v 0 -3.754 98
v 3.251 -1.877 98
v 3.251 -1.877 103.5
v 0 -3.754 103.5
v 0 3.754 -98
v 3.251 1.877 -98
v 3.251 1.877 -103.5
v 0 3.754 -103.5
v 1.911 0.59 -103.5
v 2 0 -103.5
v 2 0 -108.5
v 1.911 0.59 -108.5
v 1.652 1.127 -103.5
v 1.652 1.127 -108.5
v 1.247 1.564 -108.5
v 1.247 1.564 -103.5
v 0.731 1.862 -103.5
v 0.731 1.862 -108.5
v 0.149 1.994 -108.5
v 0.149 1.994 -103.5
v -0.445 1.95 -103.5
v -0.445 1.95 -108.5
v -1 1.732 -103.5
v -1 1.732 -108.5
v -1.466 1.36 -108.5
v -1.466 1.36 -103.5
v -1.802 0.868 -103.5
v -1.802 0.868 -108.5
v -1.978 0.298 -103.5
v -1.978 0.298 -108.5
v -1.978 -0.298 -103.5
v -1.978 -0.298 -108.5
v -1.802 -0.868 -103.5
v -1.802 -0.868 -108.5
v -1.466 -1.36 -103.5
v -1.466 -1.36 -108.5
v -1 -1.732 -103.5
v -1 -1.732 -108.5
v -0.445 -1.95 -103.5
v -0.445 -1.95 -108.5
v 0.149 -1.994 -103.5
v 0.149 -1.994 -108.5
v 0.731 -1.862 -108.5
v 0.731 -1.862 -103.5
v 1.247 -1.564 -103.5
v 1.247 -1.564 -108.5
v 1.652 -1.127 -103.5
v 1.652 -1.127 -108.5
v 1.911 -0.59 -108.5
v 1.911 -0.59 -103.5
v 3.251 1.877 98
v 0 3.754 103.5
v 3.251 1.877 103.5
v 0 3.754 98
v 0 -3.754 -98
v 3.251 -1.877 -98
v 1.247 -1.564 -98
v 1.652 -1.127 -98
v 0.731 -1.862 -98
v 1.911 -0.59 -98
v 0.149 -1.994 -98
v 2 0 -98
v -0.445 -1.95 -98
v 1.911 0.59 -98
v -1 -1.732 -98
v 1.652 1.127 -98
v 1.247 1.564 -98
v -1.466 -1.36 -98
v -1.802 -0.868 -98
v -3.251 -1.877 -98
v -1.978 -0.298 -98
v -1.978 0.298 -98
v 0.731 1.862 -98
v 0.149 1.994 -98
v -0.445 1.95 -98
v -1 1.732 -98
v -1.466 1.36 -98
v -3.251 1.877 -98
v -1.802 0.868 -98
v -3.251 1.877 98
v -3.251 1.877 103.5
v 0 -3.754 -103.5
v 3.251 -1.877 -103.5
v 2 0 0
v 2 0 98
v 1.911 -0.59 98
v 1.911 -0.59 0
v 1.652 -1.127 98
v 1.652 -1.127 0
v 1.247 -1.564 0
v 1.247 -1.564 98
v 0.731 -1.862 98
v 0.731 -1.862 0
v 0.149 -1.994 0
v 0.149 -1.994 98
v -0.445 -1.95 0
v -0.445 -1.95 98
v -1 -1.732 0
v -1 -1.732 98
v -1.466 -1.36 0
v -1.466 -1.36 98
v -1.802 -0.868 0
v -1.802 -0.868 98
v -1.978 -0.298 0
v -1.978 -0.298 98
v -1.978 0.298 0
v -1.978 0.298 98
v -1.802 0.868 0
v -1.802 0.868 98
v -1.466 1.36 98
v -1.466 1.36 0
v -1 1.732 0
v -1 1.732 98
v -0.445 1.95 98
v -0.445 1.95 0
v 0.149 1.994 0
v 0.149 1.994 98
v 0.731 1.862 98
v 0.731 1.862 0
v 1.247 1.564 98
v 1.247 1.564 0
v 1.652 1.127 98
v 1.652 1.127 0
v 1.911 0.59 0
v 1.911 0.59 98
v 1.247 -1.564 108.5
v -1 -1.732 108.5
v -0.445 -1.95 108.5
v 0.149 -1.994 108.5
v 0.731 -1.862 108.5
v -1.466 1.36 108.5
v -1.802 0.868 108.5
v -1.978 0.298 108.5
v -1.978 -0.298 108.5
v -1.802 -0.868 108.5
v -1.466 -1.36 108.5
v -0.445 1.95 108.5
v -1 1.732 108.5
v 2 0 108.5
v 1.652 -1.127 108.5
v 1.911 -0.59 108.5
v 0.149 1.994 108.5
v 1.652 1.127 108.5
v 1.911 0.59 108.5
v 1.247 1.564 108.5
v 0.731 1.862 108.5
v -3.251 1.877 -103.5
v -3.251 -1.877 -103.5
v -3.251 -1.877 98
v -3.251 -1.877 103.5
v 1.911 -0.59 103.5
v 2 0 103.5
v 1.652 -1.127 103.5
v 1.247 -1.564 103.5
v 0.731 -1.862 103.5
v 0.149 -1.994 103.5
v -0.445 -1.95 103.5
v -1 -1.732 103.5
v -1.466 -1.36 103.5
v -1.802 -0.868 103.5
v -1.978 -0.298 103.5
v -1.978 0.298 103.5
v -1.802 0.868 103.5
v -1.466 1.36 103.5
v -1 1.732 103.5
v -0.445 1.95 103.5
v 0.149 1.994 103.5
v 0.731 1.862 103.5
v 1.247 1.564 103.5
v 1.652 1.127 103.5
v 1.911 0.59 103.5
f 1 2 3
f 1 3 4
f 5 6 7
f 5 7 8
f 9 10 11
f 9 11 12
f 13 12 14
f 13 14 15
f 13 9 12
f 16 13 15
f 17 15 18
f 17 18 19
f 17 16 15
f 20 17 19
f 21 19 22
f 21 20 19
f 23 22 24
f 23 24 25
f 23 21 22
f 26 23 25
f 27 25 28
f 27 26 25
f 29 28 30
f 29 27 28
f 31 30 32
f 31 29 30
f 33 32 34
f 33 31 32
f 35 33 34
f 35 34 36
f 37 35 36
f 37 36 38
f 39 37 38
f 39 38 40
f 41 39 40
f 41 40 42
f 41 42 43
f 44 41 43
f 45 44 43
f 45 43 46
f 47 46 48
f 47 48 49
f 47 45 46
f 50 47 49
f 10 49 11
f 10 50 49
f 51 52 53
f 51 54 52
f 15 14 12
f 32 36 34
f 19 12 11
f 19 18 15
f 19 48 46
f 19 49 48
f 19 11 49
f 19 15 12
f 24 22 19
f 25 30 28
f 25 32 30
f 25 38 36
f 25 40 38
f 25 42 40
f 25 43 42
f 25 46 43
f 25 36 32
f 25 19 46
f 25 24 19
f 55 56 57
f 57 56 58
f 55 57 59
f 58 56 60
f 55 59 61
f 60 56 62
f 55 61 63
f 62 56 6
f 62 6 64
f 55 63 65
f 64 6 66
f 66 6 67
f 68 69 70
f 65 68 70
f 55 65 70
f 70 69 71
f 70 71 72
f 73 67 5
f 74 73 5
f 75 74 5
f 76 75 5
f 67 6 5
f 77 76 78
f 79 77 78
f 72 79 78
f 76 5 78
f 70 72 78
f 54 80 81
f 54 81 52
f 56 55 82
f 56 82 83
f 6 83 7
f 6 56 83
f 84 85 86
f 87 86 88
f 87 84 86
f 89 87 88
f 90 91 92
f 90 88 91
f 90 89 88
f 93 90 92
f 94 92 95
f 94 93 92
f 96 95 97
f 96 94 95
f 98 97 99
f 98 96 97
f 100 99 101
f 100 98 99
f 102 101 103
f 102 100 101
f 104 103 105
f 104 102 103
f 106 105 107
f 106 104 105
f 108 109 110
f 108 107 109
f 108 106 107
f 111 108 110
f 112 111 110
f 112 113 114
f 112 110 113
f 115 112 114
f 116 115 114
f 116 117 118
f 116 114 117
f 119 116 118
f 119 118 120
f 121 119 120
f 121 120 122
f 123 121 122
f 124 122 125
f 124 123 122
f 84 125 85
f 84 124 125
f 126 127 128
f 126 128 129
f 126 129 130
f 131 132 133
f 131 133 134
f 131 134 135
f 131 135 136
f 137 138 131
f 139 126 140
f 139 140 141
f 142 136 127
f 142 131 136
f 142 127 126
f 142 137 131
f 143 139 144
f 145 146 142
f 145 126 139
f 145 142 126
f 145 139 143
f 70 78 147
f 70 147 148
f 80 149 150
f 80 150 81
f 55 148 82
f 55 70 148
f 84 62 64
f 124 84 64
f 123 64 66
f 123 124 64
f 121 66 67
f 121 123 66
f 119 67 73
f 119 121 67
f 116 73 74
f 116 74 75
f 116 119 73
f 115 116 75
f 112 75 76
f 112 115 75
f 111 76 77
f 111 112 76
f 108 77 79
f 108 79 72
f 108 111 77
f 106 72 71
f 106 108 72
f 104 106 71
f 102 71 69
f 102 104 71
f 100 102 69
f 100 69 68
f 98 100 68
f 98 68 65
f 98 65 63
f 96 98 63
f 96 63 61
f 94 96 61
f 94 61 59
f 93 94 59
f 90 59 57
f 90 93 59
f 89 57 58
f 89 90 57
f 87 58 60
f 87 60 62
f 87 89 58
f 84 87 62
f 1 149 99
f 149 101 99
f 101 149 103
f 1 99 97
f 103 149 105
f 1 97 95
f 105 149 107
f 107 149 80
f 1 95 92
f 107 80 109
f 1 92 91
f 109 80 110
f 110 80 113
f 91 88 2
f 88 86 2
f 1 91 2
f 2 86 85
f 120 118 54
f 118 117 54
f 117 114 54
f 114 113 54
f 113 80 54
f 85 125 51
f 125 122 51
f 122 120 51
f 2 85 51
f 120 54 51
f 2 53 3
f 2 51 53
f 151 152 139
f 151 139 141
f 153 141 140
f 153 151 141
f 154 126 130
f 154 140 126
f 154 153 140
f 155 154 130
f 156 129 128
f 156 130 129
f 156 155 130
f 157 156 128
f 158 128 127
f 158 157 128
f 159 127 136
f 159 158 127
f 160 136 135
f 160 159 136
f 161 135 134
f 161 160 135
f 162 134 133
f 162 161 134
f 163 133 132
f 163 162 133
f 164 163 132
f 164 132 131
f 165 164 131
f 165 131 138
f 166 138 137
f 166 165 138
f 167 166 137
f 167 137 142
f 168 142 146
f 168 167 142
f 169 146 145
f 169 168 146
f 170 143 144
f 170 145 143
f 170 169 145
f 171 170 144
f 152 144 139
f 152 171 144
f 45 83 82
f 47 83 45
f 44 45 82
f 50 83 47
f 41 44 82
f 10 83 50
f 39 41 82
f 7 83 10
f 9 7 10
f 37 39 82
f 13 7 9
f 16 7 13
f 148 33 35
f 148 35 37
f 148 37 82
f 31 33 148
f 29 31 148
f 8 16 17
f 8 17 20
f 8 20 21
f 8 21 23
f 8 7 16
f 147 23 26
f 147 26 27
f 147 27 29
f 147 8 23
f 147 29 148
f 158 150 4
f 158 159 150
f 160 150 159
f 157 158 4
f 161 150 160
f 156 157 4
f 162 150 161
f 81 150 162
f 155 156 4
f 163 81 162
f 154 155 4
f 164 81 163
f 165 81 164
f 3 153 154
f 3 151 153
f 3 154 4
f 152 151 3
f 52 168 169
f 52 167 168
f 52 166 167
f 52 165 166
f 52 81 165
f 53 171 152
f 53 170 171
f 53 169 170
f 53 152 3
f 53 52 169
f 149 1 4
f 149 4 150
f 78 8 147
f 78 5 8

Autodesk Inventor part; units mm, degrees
ref_plane "YZ Plane" through (0, 0, 0) normal (1, 0, 0) x (0, 1, 0)
ref_plane "XZ Plane" through (0, 0, 0) normal (0, 1, 0) x (-1, 0, 0)
ref_plane "XY Plane" through (0, 0, 0) normal (0, 0, 1) x (1, 0, 0)
sketch "Эскиз1" plane through (0, 0, 0) normal (0, 0, 1) x (1, 0, 0)
  circle A0 centre (0, 0) radius 2
  dimension "d0" = 4
extrude "Выдавливание1" add sketch "Эскиз1" along normal blind 98
sketch "Эскиз2" plane through (0, 0, 98) normal (0, 0, 1) x (1, 0, 0)
  line L0 (0, 3.7538) -> (3.2509, 1.8769)
  line L1 (3.2509, 1.8769) -> (3.2509, -1.8769)
  line L2 (3.2509, -1.8769) -> (0, -3.7538)
  line L3 (0, -3.7538) -> (-3.2509, -1.8769)
  line L4 (-3.2509, -1.8769) -> (-3.2509, 1.8769)
  line L5 (-3.2509, 1.8769) -> (0, 3.7538)
  point P0 (0, 0)
  point P1 (0, 0)
extrude "Выдавливание2" add sketch "Эскиз2" along normal blind 5.5
sketch "Эскиз3" plane through (0, 0, 103.5) normal (0, 0, 1) x (1, 0, 0)
  circle A0 centre (0, 0) radius 2 projected
  circle A1 centre (0, 0) radius 2
extrude "Выдавливание3" add sketch "Эскиз3" along normal blind 5
thread "Резьба1" size "M4x0.7" class "6g" standard "ANSI Metric M Profile" full length
mirror "Зеркальное отражение1" about plane through (0, 0, 0) normal (0, 0, -1)
properties part number "ось пушки 3" material "Сталь, литейная"
